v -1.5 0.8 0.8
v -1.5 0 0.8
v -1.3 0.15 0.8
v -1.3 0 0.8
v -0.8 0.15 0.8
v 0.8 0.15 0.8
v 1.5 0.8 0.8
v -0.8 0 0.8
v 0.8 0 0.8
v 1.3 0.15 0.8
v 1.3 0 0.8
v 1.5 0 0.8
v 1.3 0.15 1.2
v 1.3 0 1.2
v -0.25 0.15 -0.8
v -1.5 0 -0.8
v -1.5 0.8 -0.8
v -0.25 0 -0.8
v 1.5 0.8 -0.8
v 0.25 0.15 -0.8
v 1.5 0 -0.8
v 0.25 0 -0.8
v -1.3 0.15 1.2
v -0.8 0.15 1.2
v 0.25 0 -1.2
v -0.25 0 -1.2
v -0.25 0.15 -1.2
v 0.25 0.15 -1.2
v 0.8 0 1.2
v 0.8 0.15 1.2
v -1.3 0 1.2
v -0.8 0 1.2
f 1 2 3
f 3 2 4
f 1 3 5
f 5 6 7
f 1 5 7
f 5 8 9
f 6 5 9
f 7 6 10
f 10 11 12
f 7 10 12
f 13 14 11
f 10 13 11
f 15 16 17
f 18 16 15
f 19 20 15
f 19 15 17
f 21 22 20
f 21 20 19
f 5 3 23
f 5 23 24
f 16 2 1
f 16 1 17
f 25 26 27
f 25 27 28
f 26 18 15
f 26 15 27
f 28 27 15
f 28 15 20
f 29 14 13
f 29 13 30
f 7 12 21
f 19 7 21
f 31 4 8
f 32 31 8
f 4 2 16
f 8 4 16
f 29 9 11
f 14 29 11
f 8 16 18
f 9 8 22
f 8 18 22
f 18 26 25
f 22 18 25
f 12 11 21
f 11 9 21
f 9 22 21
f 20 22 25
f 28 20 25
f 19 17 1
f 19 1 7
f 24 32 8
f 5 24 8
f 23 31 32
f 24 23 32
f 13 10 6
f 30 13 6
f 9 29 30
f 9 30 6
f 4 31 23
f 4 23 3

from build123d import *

# Parameters (mm, degrees)
BASES_W       = 3
BASES_H       = 1.6
BASE_DEPTH    = 0.8
LEGS_W        = 0.5
LEGS_H        = 0.4
LEG_DEPTH     = 0.15
SIDELEGS_W    = 0.5
SIDELEGS_H    = 0.4
SIDELEG_DEPTH = 0.15


with BuildPart() as part:
    # BaseS → Base (new body)
    with BuildSketch(Plane(origin=(0, 0, 0), x_dir=(1, 0, 0), z_dir=(0, 1, 0))):
        Rectangle(BASES_W, BASES_H)
    extrude(amount=BASE_DEPTH)

    # LegS → Leg (add)
    with BuildSketch(Plane(origin=(0, 0, 0), x_dir=(1, 0, 0), z_dir=(0, 1, 0))):
        with Locations((0, 1)):
            Rectangle(LEGS_W, LEGS_H)
    extrude(amount=LEG_DEPTH)

    # SideLegS → SideLeg (add)
    with BuildSketch(Plane(origin=(0, 0, 0), x_dir=(1, 0, 0), z_dir=(0, 1, 0))):
        with Locations((-1.05, -1)):
            Rectangle(SIDELEGS_W, SIDELEGS_H)
    sideleg = extrude(amount=SIDELEG_DEPTH)

    # SLHM: SideLeg across plane
    add(sideleg.mirror(Plane(origin=(0, 0, 0), x_dir=(0, 0, 1), z_dir=(1, 0, 0))))


solid = part.part
